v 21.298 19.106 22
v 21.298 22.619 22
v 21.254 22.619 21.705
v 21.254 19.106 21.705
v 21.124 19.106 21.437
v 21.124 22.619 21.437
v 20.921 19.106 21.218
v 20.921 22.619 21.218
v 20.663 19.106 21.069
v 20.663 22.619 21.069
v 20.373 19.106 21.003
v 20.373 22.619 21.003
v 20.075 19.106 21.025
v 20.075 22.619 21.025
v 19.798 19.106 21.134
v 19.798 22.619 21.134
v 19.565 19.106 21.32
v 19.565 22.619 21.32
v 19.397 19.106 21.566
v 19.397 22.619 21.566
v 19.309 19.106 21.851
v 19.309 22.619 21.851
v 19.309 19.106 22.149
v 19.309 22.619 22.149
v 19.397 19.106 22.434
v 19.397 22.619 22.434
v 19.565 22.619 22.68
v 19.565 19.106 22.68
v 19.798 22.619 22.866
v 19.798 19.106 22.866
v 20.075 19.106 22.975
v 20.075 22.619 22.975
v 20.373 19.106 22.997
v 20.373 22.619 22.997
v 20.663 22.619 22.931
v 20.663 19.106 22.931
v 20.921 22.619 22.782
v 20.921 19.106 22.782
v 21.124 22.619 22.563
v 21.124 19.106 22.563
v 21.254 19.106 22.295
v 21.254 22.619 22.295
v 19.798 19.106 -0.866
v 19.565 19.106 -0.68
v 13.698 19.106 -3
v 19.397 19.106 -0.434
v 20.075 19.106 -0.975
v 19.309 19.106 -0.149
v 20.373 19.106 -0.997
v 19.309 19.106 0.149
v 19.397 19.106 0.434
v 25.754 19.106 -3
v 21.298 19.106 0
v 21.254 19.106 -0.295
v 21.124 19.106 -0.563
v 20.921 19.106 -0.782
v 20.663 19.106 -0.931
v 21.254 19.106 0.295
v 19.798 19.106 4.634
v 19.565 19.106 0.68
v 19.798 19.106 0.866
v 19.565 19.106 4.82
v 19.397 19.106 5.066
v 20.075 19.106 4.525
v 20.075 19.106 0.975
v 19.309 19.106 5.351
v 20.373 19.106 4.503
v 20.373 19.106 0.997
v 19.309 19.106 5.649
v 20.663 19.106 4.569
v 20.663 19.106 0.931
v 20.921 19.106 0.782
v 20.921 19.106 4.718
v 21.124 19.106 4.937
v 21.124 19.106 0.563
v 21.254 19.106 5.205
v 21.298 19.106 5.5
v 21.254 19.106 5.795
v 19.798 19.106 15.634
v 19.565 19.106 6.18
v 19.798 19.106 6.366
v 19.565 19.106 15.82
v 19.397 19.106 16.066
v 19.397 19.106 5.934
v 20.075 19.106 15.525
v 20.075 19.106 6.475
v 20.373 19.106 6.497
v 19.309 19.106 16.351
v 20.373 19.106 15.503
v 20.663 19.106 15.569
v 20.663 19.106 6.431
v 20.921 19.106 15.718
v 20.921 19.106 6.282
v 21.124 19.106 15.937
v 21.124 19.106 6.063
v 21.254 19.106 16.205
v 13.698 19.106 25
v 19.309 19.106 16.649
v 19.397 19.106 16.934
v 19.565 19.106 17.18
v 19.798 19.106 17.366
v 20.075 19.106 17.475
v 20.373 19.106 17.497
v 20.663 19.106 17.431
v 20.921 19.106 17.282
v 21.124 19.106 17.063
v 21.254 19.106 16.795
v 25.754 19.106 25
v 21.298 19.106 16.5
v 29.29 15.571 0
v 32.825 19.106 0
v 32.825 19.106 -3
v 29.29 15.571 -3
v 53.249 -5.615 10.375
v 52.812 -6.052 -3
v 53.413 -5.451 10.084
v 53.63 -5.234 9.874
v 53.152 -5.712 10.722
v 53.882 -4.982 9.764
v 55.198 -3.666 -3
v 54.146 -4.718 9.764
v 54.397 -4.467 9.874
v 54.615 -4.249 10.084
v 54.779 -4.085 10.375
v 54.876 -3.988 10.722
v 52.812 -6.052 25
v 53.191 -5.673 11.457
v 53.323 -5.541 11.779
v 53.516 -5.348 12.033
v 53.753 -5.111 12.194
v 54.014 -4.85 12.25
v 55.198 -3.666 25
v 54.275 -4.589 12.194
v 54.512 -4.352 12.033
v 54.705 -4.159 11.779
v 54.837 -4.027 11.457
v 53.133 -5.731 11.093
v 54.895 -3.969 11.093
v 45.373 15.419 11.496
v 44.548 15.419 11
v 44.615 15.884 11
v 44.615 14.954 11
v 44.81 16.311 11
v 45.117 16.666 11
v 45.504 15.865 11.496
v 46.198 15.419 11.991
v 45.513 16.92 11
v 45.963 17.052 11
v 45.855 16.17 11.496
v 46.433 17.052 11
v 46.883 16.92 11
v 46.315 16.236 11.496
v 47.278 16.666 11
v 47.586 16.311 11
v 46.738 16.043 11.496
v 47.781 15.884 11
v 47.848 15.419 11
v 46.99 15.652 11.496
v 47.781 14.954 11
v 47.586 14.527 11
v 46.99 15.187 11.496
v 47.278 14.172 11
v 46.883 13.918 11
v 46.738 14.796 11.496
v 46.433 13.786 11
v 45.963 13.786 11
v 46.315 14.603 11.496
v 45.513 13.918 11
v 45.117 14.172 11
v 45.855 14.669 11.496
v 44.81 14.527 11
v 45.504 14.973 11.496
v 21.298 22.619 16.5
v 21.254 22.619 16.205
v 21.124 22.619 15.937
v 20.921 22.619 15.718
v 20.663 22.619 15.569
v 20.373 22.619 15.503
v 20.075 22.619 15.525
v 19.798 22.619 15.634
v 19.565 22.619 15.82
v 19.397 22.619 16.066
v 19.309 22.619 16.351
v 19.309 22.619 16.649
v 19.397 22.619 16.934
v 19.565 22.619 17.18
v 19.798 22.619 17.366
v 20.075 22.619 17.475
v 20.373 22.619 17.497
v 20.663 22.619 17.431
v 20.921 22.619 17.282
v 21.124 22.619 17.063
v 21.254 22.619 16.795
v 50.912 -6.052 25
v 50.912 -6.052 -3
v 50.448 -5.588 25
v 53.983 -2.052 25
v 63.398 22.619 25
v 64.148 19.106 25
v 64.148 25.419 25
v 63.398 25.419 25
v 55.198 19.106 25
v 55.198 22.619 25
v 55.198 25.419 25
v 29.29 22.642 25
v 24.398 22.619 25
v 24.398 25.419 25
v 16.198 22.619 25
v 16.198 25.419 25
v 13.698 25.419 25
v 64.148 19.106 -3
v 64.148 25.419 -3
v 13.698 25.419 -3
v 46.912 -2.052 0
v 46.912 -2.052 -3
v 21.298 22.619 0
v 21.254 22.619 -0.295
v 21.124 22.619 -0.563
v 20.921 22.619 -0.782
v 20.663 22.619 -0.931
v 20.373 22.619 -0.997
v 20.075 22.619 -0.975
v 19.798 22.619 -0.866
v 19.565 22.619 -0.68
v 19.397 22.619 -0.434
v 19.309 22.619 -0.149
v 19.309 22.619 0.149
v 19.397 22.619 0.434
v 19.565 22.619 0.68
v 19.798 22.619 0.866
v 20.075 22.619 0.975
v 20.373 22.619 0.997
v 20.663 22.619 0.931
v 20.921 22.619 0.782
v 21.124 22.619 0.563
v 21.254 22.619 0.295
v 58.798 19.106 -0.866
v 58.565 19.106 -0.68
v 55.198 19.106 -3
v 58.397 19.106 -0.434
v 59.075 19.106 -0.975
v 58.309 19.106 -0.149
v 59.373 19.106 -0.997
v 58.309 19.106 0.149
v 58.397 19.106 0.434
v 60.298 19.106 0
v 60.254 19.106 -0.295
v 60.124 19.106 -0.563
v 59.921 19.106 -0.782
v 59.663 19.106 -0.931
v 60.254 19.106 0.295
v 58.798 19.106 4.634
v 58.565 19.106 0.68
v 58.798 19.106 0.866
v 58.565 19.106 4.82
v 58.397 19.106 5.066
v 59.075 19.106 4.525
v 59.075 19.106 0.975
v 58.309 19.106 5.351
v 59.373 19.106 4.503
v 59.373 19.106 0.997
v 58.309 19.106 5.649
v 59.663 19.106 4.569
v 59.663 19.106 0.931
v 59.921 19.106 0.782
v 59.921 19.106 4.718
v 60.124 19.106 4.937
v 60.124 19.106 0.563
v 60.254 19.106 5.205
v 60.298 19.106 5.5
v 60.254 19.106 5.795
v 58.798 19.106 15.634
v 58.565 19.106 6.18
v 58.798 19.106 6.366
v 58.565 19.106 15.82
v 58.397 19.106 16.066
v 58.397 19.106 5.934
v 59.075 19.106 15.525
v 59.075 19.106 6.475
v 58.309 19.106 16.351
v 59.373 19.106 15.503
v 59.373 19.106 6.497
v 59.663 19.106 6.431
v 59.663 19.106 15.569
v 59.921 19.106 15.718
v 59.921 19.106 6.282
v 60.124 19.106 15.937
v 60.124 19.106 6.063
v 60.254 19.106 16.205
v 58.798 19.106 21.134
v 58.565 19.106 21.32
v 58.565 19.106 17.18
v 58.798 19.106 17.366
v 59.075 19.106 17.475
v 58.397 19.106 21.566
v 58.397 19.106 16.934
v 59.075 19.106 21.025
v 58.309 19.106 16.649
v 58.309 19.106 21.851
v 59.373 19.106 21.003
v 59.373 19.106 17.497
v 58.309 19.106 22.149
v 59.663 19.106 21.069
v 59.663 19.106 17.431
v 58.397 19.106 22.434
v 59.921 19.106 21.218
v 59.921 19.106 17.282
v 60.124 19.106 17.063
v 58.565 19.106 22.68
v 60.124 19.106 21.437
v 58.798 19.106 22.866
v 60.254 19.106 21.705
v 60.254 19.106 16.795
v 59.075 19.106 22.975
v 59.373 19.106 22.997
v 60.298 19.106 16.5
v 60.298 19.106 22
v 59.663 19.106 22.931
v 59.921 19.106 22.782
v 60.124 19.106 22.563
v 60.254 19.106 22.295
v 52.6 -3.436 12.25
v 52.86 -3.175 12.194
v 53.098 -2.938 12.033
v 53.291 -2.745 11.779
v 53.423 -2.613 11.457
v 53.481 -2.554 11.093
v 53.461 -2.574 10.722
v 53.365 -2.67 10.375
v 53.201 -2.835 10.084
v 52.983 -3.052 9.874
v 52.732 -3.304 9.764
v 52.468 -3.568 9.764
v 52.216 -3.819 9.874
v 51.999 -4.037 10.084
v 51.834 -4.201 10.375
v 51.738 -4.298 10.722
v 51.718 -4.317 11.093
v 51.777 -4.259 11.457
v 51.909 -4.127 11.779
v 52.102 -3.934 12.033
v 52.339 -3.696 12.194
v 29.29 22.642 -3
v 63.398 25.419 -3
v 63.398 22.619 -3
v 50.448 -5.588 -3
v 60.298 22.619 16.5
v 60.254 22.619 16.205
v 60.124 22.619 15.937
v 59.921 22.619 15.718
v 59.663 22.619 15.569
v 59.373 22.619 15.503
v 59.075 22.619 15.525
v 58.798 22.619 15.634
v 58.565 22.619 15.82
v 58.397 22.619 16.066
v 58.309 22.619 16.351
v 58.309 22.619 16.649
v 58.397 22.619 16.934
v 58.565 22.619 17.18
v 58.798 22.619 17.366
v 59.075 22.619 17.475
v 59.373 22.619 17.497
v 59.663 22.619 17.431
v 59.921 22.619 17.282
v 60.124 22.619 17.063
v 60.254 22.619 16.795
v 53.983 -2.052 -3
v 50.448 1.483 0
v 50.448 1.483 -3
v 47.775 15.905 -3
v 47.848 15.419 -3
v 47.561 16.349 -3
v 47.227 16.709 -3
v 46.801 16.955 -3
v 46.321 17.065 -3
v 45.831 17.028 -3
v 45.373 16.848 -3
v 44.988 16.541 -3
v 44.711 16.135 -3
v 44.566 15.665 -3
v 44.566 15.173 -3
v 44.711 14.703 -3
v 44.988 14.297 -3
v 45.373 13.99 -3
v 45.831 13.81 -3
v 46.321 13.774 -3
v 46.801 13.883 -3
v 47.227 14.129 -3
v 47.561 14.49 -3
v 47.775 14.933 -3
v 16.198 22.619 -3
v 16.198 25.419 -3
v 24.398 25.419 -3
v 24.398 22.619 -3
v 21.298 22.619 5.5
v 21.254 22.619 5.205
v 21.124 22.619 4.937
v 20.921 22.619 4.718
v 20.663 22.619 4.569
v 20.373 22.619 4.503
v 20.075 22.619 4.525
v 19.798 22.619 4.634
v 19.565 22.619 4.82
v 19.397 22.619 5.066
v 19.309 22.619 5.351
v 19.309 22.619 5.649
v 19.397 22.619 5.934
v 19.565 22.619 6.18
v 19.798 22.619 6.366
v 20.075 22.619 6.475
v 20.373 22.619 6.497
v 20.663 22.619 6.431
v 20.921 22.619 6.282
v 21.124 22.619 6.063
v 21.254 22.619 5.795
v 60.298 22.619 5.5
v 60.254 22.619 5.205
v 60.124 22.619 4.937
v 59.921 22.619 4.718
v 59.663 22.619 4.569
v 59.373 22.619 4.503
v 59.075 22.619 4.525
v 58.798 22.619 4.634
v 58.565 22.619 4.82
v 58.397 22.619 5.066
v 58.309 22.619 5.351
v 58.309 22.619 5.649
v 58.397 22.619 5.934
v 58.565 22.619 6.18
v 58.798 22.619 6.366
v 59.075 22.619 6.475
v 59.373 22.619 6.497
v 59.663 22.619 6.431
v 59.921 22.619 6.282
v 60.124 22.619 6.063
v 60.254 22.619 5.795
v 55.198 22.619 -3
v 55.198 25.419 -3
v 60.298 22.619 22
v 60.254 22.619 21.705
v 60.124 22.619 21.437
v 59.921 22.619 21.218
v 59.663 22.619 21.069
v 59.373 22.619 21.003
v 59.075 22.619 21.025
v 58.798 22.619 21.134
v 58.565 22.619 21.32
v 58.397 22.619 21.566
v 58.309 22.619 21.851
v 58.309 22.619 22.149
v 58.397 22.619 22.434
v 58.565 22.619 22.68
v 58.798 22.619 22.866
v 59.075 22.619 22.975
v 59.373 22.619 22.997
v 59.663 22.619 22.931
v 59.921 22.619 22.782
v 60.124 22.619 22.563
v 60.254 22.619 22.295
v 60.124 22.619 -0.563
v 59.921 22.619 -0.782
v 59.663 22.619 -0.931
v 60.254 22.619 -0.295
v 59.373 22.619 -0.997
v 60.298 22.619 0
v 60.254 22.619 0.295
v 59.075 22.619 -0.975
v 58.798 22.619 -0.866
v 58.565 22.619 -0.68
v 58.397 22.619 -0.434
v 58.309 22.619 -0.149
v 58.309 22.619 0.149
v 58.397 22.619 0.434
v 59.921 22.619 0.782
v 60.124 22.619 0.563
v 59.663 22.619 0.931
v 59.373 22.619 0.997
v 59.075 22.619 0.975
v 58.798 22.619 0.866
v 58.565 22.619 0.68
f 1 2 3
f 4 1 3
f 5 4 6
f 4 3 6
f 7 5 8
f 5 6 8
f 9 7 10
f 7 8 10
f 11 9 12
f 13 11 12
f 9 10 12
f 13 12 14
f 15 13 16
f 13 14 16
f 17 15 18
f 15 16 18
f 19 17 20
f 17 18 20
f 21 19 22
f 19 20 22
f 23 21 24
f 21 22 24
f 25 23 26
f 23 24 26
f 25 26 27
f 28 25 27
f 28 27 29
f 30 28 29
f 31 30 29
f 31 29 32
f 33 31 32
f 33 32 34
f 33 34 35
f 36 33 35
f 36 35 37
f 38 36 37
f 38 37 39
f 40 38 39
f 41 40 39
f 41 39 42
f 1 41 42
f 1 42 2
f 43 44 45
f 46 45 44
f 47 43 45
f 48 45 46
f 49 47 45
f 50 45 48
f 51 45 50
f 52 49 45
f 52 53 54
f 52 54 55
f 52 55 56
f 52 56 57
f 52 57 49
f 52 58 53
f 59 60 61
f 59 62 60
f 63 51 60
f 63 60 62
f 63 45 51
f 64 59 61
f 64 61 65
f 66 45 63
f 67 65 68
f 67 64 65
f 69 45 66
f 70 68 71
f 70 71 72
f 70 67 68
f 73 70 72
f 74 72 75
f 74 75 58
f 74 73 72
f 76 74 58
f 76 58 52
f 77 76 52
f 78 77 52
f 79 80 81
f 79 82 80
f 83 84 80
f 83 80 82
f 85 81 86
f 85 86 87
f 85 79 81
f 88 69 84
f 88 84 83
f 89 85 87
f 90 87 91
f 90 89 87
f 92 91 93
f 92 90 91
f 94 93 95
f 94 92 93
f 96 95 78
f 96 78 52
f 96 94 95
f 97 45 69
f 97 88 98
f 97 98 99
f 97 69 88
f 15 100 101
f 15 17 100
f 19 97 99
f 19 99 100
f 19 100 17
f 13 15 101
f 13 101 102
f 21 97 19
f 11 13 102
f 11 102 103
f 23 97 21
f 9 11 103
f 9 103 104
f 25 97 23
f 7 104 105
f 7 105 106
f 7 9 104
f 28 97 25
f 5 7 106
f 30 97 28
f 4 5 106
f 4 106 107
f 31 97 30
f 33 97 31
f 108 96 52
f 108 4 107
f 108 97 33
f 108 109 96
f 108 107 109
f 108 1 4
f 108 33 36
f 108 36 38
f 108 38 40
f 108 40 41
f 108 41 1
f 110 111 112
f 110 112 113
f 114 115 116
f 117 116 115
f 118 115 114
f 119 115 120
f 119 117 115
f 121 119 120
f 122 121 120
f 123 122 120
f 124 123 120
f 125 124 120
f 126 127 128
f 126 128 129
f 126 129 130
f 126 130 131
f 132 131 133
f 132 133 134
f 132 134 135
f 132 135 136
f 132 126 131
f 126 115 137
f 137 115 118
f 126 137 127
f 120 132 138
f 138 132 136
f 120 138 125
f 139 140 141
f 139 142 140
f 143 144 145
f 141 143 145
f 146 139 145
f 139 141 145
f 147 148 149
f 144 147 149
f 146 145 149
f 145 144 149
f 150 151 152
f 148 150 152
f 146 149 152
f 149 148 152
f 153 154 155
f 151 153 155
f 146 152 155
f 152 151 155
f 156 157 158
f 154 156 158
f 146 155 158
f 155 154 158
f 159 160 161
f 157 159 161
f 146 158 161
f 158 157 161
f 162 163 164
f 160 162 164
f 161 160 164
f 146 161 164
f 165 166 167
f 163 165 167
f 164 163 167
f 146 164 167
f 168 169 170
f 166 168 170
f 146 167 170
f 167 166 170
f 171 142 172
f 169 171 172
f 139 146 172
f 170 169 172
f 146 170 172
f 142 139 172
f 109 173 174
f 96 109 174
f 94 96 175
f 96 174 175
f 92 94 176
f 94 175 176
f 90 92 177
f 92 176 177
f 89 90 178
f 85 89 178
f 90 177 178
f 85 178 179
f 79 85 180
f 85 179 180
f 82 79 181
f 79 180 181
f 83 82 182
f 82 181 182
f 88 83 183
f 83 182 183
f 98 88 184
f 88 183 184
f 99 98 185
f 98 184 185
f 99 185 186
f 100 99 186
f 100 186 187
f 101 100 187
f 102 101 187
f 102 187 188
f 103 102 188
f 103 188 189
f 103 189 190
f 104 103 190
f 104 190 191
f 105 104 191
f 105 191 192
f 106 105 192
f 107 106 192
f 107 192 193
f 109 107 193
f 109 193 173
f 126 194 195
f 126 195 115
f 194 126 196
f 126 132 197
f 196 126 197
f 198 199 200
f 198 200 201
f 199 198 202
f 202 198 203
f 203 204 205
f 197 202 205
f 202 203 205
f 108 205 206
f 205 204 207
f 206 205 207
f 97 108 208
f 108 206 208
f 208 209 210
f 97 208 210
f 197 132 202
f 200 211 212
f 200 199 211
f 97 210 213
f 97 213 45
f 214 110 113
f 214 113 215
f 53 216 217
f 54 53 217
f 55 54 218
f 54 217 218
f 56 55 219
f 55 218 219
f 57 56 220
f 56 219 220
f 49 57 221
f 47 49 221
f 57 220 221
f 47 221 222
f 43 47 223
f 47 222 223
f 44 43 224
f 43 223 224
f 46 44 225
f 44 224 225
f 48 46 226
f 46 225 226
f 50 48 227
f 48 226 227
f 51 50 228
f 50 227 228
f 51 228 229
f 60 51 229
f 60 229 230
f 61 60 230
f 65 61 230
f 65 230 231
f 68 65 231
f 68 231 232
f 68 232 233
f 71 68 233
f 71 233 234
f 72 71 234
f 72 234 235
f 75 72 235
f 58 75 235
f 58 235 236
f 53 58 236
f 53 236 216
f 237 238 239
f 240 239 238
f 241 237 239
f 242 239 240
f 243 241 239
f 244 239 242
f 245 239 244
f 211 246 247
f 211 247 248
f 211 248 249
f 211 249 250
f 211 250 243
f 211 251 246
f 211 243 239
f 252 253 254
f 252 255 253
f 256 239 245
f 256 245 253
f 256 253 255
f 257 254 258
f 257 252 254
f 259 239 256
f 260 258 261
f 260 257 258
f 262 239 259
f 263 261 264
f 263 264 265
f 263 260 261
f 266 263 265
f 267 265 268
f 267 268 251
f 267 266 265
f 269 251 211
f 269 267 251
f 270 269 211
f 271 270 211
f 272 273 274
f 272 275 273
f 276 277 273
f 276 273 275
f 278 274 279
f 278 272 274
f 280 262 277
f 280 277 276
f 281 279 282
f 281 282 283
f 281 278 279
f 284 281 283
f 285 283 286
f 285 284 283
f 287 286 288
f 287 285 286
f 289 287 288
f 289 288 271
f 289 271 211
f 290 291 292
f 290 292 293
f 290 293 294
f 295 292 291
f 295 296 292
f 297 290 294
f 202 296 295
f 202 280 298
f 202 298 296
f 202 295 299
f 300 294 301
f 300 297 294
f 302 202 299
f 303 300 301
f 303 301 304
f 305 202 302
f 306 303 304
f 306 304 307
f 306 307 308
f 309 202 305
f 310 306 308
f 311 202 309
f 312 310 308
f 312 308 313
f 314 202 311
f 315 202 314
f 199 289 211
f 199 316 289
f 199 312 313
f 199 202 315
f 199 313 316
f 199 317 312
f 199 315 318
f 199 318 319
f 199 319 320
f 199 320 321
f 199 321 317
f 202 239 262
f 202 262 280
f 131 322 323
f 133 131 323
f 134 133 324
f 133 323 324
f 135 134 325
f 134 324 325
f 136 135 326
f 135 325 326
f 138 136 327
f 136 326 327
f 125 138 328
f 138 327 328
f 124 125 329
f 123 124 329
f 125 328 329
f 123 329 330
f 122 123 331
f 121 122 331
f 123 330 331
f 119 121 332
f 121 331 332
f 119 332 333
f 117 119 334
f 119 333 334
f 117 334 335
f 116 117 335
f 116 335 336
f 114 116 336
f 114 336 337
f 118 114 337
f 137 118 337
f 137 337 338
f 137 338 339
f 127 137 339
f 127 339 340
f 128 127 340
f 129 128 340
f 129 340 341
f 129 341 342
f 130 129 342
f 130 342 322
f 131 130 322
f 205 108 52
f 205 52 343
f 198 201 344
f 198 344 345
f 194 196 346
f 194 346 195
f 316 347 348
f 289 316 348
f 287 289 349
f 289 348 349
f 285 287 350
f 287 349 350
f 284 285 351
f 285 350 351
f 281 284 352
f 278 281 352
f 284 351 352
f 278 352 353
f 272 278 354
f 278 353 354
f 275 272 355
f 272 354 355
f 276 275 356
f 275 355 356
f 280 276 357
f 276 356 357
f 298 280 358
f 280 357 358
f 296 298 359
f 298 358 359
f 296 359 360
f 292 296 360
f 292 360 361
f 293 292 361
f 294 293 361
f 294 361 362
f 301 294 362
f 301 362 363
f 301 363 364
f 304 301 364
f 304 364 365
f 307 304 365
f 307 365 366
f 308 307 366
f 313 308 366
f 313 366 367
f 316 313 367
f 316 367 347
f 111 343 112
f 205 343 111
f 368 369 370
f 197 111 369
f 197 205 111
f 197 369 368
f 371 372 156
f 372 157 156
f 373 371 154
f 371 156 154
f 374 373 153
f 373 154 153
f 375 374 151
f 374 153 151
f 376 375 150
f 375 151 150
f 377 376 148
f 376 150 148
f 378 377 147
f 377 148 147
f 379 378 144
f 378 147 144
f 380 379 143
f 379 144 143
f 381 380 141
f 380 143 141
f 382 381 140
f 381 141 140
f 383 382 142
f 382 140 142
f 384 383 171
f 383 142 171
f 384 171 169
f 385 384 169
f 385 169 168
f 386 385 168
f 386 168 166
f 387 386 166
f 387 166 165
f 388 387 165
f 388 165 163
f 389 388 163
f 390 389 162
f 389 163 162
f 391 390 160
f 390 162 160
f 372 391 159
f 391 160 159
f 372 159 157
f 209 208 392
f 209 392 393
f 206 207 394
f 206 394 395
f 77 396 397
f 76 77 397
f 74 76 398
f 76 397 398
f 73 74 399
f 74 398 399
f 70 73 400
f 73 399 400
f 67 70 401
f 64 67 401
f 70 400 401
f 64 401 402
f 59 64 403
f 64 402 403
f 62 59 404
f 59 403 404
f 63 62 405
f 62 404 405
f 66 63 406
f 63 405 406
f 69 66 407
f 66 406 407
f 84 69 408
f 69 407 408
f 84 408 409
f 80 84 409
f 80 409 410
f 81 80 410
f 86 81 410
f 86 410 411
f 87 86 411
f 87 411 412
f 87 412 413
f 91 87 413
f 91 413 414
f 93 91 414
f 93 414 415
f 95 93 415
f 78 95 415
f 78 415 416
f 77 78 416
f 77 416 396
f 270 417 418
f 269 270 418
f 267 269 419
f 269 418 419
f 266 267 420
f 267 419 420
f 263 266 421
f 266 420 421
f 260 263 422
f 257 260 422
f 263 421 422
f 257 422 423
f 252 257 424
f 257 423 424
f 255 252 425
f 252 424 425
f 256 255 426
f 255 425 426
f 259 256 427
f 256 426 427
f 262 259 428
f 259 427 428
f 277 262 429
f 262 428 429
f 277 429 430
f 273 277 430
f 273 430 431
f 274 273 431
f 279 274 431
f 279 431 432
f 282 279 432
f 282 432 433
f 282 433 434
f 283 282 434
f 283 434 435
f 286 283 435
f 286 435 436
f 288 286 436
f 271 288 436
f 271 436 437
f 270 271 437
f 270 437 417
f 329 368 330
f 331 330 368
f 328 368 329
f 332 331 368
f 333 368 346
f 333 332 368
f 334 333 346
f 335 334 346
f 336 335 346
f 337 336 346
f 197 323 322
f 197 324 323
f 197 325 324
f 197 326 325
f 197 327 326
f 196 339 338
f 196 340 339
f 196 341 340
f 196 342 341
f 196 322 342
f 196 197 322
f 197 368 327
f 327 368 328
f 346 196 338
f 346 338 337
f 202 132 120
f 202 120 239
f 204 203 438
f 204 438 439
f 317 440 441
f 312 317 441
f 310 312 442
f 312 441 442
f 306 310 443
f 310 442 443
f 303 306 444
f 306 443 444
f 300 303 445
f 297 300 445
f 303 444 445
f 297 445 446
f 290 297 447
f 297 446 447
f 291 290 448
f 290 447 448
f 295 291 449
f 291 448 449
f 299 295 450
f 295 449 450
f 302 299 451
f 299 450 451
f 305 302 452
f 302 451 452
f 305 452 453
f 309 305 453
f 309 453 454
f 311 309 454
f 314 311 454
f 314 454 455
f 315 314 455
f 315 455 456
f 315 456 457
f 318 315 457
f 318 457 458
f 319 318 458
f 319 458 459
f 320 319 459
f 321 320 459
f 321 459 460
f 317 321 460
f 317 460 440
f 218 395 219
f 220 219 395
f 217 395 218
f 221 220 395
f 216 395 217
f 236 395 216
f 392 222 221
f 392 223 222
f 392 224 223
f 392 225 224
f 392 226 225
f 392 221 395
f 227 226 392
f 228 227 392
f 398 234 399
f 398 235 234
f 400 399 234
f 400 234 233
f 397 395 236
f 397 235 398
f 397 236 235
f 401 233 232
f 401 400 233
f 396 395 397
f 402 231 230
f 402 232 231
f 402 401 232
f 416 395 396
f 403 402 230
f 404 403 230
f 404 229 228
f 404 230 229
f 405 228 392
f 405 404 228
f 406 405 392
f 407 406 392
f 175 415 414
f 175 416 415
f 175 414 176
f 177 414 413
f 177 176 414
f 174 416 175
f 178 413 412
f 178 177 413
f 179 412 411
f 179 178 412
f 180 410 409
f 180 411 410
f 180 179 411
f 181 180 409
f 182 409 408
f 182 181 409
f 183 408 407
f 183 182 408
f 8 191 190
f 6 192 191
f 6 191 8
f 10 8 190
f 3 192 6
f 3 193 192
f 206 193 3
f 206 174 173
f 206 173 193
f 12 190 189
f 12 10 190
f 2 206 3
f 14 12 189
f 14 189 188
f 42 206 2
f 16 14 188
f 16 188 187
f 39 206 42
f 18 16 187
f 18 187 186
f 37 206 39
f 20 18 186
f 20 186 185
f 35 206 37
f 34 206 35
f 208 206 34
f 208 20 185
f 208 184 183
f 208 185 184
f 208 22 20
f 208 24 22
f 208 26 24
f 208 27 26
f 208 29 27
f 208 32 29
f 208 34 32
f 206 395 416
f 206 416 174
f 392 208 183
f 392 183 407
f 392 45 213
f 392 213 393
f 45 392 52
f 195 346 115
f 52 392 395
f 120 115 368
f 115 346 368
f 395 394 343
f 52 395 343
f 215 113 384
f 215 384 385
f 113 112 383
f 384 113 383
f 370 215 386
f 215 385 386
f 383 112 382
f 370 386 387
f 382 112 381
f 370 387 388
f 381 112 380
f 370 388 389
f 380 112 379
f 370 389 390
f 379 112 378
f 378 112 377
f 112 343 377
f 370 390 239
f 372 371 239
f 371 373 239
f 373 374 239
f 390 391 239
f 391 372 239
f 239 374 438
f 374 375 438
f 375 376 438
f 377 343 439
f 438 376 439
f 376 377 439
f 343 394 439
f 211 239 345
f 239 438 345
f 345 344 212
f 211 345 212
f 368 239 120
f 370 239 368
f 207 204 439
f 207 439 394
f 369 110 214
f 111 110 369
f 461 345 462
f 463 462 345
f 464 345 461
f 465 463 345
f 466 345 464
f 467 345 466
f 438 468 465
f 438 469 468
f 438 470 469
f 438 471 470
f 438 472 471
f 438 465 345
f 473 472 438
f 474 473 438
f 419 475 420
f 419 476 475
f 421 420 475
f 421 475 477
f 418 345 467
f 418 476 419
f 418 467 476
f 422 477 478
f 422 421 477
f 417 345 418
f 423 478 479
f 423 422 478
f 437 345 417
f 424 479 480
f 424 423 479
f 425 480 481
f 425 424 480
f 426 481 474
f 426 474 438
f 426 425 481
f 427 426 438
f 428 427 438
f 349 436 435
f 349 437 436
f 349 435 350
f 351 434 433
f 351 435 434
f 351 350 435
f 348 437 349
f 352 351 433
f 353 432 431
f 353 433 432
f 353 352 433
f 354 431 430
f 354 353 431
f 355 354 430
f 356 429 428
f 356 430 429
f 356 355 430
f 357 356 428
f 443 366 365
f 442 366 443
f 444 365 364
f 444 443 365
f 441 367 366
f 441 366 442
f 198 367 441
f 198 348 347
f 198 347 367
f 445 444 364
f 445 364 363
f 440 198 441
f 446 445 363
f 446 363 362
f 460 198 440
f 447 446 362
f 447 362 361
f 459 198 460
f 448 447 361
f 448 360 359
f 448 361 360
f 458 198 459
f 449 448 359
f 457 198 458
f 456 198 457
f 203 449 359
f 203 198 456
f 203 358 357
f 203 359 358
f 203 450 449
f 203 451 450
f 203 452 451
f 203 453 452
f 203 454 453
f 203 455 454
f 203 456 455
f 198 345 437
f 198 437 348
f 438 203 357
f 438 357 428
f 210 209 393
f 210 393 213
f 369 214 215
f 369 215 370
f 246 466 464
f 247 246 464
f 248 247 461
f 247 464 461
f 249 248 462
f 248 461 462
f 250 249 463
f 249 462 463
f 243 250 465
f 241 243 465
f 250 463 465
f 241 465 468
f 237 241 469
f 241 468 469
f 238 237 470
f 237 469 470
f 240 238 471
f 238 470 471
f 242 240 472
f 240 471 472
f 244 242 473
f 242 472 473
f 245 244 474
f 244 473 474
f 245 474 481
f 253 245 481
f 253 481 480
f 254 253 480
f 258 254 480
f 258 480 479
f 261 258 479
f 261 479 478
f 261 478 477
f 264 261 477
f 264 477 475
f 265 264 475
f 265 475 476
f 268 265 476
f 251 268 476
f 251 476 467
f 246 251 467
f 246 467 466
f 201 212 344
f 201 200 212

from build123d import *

# Parameters (mm, degrees)
BOSS_EXTRUDE1_DEPTH          = 25
BOSS_EXTRUDE2_DEPTH          = 3
M4X0_7_TAPPED_HOLE1_D        = 3.3
M4X0_7_TAPPED_HOLE1_DEPTH    = 14
M4X0_7_TAPPED_HOLE1_TIP      = 0.991420021
F_2_0_2_DIAMETER_HOLE1_D     = 2
F_2_0_2_DIAMETER_HOLE1_DEPTH = 3.512823811
F_2_0_2_DIAMETER_HOLE2_D     = 2
F_2_0_2_DIAMETER_HOLE2_DEPTH = 3.512823811
M3X0_5_TAPPED_HOLE1_D        = 2.5
M3X0_5_TAPPED_HOLE1_DEPTH    = 2


with BuildPart() as part:
    # Sketch1 → Boss-Extrude1 (new body)
    with BuildSketch(Plane.XY):
        Polygon((13.697937079, 25.419129705), (16.197937079, 25.419129705), (16.197937079, 22.619129705), (24.397937079, 22.619129705), (24.397937079, 25.419129705), (55.197937079, 25.419129705), (55.197937079, 22.619129705), (63.397937079, 22.619129705), (63.397937079, 25.419129705), (64.147937079, 25.419129705), (64.147937079, 19.106305894), (55.197937079, 19.106305894), (55.197937079, -3.66605846), (52.811898109, -6.05209743), (50.912403173, -6.05209743), (50.447937079, -5.587631336), (53.983470985, -2.05209743), (29.289533755, 22.6418398), (25.753999849, 19.106305894), (13.697937079, 19.106305894), align=None)
    extrude(amount=BOSS_EXTRUDE1_DEPTH)

    # Sketch2 → Boss-Extrude2 (add)
    with BuildSketch(Plane(origin=(0, 0, 0), x_dir=(-1, 0, 0), z_dir=(0, 0, -1))):
        Polygon((-64.147937079, 25.419129705), (-63.397937079, 25.419129705), (-63.397937079, 22.619129705), (-55.197937079, 22.619129705), (-55.197937079, 25.419129705), (-24.397937079, 25.419129705), (-24.397937079, 22.619129705), (-16.197937079, 22.619129705), (-16.197937079, 25.419129705), (-13.697937079, 25.419129705), (-13.697937079, 19.106305894), (-25.753999849, 19.106305894), (-29.289533755, 22.6418398), (-32.825067661, 19.106305894), (-29.289533755, 15.570771988), (-46.912403173, -2.05209743), (-50.447937079, 1.483436476), (-53.983470985, -2.05209743), (-50.447937079, -5.587631336), (-50.912403173, -6.05209743), (-52.811898109, -6.05209743), (-55.197937079, -3.66605846), (-55.197937079, 19.106305894), (-64.147937079, 19.106305894), align=None)
    extrude(amount=BOSS_EXTRUDE2_DEPTH)

    # M4x0.7 Tapped Hole1
    with Locations(Plane(origin=(0, 0, -3), x_dir=(-1, 0, 0), z_dir=(0, 0, -1))):
        with Locations((-46.197937079, 15.419129705)):
            Hole(M4X0_7_TAPPED_HOLE1_D / 2, depth=M4X0_7_TAPPED_HOLE1_DEPTH)
            with Locations((0, 0, -(M4X0_7_TAPPED_HOLE1_DEPTH + M4X0_7_TAPPED_HOLE1_TIP / 2))):  # 118° drill point
                Cone(0, M4X0_7_TAPPED_HOLE1_D / 2, M4X0_7_TAPPED_HOLE1_TIP, mode=Mode.SUBTRACT)

    # Ø2.0 (2) Diameter Hole1
    with Locations(Plane(origin=(0, 19.106305894, 0), x_dir=(-1, 0, 0), z_dir=(0, -1, 0))):
        with Locations((-59.297937079, -22), (-59.297937079, -16.5), (-59.297937079, -5.5), (-59.297937079, 0)):
            Hole(F_2_0_2_DIAMETER_HOLE1_D / 2, depth=F_2_0_2_DIAMETER_HOLE1_DEPTH)

    # Ø2.0 (2) Diameter Hole2
    with Locations(Plane(origin=(0, 19.106305894, 0), x_dir=(-1, 0, 0), z_dir=(0, -1, 0))):
        with Locations((-20.297937079, -22), (-20.297937079, -16.5), (-20.297937079, -5.5), (-20.297937079, 0)):
            Hole(F_2_0_2_DIAMETER_HOLE2_D / 2, depth=F_2_0_2_DIAMETER_HOLE2_DEPTH)

    # M3x0.5 Tapped Hole1
    with Locations(Plane(origin=(29.43199777, -29.43199777, 0), x_dir=(0, 0, -1), z_dir=(0.707106781, -0.707106781, 0))):
        with Locations((-11, 34.764172148)):
            Hole(M3X0_5_TAPPED_HOLE1_D / 2, depth=M3X0_5_TAPPED_HOLE1_DEPTH)


solid = part.part
